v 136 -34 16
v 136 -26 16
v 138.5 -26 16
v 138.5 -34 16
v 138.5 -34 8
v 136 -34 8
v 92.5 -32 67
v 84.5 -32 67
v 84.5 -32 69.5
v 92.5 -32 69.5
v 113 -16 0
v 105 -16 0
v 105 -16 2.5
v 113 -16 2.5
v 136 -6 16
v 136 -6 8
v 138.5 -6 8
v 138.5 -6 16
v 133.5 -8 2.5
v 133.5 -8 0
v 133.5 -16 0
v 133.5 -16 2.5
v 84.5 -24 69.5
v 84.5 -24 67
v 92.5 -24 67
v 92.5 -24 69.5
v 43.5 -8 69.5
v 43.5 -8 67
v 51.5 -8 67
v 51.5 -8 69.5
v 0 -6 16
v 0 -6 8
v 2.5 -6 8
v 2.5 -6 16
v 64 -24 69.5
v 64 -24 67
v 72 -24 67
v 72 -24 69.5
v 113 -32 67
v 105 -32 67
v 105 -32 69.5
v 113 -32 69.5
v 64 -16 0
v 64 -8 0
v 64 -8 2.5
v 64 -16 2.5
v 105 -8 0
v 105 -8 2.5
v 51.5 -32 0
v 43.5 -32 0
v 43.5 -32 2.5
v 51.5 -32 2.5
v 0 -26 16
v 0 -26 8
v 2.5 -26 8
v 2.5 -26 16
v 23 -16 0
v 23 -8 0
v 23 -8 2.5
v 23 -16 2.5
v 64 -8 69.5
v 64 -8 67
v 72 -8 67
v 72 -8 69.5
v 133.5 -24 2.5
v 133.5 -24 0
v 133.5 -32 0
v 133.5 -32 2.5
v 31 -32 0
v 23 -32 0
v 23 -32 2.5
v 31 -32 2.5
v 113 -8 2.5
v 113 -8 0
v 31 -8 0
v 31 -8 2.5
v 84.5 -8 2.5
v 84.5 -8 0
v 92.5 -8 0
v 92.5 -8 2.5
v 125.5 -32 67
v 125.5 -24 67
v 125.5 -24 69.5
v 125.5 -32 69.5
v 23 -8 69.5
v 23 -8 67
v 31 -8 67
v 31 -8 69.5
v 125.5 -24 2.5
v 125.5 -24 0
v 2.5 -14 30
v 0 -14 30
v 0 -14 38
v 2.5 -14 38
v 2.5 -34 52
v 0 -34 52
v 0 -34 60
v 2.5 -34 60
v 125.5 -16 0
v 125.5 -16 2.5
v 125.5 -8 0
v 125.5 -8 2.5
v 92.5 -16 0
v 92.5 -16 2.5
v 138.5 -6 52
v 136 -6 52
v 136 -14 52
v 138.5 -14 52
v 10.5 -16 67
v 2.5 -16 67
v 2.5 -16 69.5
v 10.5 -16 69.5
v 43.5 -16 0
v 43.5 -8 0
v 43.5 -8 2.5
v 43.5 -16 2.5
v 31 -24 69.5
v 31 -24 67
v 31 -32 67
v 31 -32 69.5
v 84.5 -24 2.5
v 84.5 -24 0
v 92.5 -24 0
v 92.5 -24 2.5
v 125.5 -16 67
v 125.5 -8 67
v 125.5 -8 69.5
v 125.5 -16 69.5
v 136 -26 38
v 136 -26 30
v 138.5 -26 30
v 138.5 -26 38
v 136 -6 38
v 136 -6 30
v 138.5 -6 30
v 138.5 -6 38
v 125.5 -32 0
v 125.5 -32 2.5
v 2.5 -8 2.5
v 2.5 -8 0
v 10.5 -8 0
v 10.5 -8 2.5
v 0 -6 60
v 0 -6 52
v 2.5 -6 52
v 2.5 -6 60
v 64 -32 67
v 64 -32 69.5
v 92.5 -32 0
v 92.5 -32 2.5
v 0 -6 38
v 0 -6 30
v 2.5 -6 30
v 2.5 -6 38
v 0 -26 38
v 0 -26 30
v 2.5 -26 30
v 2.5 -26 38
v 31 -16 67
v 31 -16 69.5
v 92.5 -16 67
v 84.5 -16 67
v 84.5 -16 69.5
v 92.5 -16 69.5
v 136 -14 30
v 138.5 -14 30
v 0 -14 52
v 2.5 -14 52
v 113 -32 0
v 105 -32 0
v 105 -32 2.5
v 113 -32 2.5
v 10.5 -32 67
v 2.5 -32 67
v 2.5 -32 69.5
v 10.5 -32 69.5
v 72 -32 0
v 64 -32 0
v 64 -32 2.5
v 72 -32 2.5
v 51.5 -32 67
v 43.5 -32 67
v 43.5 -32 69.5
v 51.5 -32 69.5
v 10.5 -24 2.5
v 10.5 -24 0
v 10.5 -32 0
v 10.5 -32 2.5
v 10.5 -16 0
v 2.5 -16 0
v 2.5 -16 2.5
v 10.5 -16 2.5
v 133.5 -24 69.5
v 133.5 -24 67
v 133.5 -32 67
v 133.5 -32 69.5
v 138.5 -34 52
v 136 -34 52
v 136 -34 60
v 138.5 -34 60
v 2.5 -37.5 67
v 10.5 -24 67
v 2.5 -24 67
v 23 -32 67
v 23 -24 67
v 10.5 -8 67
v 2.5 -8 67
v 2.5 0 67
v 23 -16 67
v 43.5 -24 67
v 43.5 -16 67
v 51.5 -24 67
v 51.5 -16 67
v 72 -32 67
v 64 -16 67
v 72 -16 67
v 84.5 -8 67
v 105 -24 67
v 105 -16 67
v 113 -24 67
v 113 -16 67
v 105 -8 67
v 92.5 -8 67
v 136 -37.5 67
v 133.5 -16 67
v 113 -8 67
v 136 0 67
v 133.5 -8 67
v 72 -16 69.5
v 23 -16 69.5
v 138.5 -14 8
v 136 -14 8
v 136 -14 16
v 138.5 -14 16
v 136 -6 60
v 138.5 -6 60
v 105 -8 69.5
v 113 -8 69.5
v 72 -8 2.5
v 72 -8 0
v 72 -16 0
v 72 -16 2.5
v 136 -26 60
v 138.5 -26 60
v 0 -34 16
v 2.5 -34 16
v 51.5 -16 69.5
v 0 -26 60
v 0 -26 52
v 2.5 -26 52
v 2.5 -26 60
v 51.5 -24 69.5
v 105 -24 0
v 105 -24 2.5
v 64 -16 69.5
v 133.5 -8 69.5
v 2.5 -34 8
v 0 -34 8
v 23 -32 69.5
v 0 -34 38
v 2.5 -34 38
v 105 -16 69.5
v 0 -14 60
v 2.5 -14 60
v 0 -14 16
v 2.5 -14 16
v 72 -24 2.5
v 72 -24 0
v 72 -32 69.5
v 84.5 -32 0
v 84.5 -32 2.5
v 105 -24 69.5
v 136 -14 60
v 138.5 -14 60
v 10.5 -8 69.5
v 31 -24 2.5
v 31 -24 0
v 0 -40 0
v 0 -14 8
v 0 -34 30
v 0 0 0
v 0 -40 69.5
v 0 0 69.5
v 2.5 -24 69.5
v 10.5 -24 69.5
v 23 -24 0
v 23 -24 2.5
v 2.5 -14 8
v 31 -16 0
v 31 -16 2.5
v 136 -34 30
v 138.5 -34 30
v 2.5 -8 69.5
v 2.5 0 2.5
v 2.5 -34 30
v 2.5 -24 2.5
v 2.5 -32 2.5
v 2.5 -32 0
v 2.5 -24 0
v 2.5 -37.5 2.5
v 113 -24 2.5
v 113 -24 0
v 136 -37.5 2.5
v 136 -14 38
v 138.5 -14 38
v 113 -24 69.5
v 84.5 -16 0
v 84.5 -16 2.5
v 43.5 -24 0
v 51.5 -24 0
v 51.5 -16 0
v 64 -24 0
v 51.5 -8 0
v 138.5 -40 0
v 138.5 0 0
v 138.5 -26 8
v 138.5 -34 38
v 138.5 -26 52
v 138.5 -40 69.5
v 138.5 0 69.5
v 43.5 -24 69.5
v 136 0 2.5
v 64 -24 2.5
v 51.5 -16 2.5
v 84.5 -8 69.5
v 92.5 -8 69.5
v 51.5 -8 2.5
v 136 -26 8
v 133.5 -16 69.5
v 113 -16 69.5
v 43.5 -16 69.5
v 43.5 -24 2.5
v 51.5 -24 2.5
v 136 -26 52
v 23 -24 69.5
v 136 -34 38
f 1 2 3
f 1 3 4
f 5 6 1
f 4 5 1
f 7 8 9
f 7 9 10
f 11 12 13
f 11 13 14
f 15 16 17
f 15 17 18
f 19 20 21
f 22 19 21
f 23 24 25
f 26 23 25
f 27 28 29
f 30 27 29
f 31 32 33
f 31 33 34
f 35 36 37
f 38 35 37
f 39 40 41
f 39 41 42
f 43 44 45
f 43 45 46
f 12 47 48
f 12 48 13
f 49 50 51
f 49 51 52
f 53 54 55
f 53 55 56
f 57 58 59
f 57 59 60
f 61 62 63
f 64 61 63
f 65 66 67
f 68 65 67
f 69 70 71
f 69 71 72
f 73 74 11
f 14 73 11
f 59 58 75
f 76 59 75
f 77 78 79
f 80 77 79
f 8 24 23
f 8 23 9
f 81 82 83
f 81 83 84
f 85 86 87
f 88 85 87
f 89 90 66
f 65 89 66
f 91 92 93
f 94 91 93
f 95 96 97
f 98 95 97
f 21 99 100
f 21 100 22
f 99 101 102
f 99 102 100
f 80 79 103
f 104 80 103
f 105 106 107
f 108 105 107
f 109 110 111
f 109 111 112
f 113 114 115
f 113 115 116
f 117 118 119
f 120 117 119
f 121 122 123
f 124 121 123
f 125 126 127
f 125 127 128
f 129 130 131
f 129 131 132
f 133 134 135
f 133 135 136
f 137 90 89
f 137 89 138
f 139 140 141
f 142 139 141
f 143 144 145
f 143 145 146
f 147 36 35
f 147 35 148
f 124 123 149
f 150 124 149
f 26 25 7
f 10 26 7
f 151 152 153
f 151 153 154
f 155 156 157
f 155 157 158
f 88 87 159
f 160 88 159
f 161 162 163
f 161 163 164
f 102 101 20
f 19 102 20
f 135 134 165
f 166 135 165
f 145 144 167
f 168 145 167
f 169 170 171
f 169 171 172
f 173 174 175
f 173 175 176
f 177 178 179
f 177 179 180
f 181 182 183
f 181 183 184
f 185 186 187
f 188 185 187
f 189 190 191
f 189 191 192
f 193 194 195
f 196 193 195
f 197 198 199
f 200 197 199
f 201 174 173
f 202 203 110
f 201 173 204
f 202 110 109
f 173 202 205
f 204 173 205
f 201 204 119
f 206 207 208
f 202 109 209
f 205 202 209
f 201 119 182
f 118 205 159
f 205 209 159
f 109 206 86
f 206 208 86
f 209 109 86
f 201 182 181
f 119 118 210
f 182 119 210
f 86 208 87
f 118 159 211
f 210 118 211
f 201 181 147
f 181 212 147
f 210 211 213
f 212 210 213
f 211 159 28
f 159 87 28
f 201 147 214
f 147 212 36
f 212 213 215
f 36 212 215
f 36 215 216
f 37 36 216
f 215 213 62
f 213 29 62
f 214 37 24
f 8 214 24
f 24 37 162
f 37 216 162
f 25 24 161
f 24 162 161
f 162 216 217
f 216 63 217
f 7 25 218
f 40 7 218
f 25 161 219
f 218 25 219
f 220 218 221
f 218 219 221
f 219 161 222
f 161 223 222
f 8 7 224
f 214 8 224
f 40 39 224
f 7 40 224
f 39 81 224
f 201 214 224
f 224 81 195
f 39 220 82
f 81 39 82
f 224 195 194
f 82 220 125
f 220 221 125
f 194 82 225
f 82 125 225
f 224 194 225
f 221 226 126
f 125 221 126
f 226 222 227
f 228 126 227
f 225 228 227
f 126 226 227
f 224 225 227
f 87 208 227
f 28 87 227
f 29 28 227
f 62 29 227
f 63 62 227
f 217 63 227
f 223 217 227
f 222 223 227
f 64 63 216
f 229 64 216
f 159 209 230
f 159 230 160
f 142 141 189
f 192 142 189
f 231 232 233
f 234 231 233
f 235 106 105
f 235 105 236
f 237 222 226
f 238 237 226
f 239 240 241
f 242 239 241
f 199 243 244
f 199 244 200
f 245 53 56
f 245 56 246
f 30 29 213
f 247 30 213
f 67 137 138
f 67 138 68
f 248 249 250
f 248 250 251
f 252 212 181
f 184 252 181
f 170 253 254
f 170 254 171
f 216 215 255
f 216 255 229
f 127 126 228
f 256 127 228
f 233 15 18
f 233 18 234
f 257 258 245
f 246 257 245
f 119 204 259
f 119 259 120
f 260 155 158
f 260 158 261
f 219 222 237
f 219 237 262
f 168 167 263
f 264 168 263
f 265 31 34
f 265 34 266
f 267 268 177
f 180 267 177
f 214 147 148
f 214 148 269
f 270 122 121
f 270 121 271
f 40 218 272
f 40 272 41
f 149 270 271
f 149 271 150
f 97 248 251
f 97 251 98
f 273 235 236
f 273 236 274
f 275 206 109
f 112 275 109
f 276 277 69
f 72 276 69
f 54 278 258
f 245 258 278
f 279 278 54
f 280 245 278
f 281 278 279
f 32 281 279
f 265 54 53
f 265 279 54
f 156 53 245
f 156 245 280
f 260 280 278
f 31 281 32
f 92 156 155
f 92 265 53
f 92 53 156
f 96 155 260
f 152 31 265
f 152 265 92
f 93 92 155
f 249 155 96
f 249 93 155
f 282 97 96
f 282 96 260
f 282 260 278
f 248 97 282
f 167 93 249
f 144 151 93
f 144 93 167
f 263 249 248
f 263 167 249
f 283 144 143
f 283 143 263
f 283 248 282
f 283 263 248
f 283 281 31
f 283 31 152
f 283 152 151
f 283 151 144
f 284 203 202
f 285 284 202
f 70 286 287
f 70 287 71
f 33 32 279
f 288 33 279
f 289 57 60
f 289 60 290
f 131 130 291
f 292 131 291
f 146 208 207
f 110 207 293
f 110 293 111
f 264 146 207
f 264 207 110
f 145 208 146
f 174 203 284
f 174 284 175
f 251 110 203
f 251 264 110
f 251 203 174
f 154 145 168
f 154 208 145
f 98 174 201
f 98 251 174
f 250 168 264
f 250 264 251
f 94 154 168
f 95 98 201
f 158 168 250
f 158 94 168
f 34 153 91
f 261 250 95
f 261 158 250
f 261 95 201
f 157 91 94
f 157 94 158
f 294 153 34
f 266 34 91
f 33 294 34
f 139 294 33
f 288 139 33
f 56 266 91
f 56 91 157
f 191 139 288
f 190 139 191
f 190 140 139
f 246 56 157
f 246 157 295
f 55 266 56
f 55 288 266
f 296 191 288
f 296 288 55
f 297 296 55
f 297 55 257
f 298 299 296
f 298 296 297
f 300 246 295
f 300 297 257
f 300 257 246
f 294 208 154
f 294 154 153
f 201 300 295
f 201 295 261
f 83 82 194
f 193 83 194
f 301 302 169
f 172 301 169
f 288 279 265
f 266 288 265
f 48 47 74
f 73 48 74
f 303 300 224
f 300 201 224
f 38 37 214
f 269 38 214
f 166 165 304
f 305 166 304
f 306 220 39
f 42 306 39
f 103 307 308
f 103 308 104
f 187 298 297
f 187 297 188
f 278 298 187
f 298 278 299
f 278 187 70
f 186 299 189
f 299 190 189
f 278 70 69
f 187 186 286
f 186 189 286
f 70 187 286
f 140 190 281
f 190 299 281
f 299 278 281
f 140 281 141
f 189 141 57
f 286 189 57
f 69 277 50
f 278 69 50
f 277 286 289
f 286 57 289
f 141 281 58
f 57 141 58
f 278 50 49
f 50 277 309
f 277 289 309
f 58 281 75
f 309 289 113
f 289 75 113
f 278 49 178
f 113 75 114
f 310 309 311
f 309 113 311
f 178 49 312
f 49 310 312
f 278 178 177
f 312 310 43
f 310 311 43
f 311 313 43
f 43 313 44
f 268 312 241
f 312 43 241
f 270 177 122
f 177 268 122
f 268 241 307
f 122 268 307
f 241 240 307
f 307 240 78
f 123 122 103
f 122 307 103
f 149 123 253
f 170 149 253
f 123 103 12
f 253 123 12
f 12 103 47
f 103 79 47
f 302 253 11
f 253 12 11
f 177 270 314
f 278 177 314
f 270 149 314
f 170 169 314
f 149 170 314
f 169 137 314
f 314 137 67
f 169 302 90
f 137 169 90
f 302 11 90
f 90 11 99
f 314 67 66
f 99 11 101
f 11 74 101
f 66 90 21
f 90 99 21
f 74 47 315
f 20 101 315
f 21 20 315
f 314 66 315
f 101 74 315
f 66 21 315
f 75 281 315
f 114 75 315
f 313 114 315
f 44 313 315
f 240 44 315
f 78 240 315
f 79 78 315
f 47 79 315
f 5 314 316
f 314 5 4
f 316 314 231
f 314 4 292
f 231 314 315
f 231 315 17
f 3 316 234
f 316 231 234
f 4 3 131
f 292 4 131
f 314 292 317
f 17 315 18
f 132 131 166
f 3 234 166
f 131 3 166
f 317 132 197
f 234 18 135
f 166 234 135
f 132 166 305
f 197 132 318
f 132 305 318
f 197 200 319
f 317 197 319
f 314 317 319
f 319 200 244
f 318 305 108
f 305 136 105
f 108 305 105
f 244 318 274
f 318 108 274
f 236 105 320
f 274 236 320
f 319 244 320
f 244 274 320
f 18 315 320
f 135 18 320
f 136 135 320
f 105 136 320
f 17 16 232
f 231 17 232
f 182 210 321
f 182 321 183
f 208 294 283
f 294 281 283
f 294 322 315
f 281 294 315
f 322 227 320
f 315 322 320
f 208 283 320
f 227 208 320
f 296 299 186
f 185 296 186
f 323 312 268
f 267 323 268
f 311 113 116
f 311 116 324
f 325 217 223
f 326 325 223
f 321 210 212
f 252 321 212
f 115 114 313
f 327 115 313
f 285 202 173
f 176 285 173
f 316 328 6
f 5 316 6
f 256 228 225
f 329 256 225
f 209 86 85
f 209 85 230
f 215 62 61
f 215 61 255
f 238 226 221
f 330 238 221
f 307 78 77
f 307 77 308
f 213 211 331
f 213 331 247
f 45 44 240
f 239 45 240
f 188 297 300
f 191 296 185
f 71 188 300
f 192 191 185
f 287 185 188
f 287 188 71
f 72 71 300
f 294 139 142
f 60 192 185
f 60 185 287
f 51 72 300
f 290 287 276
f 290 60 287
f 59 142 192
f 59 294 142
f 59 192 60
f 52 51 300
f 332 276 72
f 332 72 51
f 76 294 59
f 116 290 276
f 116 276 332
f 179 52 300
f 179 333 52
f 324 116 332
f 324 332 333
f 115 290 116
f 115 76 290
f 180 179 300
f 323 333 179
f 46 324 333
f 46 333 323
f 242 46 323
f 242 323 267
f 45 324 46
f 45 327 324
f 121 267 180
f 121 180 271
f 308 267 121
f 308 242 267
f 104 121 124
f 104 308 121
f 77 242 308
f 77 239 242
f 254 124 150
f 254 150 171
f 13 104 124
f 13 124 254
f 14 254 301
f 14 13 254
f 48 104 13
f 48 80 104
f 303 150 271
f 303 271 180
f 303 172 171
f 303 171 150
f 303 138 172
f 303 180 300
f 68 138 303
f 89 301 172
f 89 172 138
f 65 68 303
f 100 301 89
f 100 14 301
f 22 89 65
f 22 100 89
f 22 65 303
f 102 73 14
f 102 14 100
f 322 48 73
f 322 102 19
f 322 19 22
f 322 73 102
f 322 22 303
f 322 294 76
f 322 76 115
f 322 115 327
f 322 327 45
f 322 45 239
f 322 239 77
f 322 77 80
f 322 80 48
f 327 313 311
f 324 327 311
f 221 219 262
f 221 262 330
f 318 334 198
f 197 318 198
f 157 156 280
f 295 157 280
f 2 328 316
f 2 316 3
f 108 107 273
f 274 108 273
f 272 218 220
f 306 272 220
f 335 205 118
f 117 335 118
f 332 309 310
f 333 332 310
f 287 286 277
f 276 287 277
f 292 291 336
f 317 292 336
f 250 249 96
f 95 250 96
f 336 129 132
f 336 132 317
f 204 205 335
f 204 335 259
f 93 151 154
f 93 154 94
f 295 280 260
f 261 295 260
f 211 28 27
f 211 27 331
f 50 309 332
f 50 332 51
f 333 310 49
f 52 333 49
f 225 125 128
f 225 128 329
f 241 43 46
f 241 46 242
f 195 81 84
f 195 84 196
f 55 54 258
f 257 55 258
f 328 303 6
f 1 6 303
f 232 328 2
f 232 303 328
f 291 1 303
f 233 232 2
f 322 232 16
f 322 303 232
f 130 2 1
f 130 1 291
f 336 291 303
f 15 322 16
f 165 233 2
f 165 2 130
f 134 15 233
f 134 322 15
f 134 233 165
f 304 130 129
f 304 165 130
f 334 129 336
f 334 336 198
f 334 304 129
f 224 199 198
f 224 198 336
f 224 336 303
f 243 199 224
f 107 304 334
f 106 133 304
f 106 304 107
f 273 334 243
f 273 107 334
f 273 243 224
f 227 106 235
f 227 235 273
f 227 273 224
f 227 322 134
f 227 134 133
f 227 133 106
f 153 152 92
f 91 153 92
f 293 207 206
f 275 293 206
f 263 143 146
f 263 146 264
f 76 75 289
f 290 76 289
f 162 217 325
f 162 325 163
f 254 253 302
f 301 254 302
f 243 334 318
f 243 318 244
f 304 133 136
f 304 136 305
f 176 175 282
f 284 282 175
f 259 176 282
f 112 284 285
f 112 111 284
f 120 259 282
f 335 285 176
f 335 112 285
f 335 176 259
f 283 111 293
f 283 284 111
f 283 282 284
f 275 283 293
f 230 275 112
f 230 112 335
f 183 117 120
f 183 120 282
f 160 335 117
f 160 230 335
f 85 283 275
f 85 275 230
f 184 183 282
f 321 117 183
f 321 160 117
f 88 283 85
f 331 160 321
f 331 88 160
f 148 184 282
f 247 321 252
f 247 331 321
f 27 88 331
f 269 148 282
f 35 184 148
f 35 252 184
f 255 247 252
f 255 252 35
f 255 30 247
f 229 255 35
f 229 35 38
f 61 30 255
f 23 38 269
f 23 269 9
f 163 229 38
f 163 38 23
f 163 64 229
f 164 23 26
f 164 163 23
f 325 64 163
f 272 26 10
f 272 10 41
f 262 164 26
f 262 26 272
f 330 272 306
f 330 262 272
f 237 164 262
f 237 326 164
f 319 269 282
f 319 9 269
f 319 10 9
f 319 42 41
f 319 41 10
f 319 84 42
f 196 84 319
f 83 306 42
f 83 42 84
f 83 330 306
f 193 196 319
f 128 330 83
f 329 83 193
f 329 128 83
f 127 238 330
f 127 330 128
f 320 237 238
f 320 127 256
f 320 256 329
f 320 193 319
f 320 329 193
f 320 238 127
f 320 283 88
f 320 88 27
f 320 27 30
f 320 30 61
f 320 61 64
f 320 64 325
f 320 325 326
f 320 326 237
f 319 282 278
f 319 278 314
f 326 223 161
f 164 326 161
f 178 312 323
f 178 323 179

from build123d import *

# Parameters (mm, degrees)
F0_W     = 138.5
F0_H     = 69.5
F1_DEPTH = 40
F2_T     = -2.5
F3_W     = 8
F3_H     = 8
F4_DEPTH = 100
F5_W     = 8
F5_H     = 8
F6_DEPTH = 200


with BuildPart() as f1:
    # F0 (on Front) → F1 (new body)
    with BuildSketch(Plane.XZ):
        with Locations((69.25, 34.75)):
            Rectangle(F0_W, F0_H)
    extrude(amount=F1_DEPTH)

    # F2
    f2_openings = [f1.faces().sort_by_distance(p)[0] for p in [
        (69.25, 0, 34.75),
    ]]
    offset(amount=F2_T, openings=f2_openings)

    # F3 (on face) → F4 (cut)
    with BuildSketch(Plane(origin=(0, 0, 0), x_dir=(1, 0, 0), z_dir=(0, 0, -1))):
        with Locations((6.5, 28)):
            Rectangle(F3_W, F3_H)
        with Locations((27, 28)):
            Rectangle(F3_W, F3_H)
        with Locations((27, 12)):
            Rectangle(F3_W, F3_H)
        with Locations((6.5, 12)):
            Rectangle(F3_W, F3_H)
        with Locations((47.5, 12)):
            Rectangle(F3_W, F3_H)
        with Locations((47.5, 28)):
            Rectangle(F3_W, F3_H)
        with Locations((68, 28)):
            Rectangle(F3_W, F3_H)
        with Locations((68, 12)):
            Rectangle(F3_W, F3_H)
        with Locations((88.5, 12)):
            Rectangle(F3_W, F3_H)
        with Locations((88.5, 28)):
            Rectangle(F3_W, F3_H)
        with Locations((109, 28)):
            Rectangle(F3_W, F3_H)
        with Locations((109, 12)):
            Rectangle(F3_W, F3_H)
        with Locations((129.5, 12)):
            Rectangle(F3_W, F3_H)
        with Locations((129.5, 28)):
            Rectangle(F3_W, F3_H)
    extrude(amount=-F4_DEPTH, mode=Mode.SUBTRACT)

    # F5 (on face) → F6 (cut)
    with BuildSketch(Plane(origin=(0, 0, 0), x_dir=(0, -1, 0), z_dir=(-1, 0, 0))):
        with Locations((10, 12)):
            Rectangle(F5_W, F5_H)
        with Locations((10, 34)):
            Rectangle(F5_W, F5_H)
        with Locations((30, 12)):
            Rectangle(F5_W, F5_H)
        with Locations((30, 34)):
            Rectangle(F5_W, F5_H)
        with Locations((30, 56)):
            Rectangle(F5_W, F5_H)
        with Locations((10, 56)):
            Rectangle(F5_W, F5_H)
    extrude(amount=-F6_DEPTH, mode=Mode.SUBTRACT)


solid = f1.part
